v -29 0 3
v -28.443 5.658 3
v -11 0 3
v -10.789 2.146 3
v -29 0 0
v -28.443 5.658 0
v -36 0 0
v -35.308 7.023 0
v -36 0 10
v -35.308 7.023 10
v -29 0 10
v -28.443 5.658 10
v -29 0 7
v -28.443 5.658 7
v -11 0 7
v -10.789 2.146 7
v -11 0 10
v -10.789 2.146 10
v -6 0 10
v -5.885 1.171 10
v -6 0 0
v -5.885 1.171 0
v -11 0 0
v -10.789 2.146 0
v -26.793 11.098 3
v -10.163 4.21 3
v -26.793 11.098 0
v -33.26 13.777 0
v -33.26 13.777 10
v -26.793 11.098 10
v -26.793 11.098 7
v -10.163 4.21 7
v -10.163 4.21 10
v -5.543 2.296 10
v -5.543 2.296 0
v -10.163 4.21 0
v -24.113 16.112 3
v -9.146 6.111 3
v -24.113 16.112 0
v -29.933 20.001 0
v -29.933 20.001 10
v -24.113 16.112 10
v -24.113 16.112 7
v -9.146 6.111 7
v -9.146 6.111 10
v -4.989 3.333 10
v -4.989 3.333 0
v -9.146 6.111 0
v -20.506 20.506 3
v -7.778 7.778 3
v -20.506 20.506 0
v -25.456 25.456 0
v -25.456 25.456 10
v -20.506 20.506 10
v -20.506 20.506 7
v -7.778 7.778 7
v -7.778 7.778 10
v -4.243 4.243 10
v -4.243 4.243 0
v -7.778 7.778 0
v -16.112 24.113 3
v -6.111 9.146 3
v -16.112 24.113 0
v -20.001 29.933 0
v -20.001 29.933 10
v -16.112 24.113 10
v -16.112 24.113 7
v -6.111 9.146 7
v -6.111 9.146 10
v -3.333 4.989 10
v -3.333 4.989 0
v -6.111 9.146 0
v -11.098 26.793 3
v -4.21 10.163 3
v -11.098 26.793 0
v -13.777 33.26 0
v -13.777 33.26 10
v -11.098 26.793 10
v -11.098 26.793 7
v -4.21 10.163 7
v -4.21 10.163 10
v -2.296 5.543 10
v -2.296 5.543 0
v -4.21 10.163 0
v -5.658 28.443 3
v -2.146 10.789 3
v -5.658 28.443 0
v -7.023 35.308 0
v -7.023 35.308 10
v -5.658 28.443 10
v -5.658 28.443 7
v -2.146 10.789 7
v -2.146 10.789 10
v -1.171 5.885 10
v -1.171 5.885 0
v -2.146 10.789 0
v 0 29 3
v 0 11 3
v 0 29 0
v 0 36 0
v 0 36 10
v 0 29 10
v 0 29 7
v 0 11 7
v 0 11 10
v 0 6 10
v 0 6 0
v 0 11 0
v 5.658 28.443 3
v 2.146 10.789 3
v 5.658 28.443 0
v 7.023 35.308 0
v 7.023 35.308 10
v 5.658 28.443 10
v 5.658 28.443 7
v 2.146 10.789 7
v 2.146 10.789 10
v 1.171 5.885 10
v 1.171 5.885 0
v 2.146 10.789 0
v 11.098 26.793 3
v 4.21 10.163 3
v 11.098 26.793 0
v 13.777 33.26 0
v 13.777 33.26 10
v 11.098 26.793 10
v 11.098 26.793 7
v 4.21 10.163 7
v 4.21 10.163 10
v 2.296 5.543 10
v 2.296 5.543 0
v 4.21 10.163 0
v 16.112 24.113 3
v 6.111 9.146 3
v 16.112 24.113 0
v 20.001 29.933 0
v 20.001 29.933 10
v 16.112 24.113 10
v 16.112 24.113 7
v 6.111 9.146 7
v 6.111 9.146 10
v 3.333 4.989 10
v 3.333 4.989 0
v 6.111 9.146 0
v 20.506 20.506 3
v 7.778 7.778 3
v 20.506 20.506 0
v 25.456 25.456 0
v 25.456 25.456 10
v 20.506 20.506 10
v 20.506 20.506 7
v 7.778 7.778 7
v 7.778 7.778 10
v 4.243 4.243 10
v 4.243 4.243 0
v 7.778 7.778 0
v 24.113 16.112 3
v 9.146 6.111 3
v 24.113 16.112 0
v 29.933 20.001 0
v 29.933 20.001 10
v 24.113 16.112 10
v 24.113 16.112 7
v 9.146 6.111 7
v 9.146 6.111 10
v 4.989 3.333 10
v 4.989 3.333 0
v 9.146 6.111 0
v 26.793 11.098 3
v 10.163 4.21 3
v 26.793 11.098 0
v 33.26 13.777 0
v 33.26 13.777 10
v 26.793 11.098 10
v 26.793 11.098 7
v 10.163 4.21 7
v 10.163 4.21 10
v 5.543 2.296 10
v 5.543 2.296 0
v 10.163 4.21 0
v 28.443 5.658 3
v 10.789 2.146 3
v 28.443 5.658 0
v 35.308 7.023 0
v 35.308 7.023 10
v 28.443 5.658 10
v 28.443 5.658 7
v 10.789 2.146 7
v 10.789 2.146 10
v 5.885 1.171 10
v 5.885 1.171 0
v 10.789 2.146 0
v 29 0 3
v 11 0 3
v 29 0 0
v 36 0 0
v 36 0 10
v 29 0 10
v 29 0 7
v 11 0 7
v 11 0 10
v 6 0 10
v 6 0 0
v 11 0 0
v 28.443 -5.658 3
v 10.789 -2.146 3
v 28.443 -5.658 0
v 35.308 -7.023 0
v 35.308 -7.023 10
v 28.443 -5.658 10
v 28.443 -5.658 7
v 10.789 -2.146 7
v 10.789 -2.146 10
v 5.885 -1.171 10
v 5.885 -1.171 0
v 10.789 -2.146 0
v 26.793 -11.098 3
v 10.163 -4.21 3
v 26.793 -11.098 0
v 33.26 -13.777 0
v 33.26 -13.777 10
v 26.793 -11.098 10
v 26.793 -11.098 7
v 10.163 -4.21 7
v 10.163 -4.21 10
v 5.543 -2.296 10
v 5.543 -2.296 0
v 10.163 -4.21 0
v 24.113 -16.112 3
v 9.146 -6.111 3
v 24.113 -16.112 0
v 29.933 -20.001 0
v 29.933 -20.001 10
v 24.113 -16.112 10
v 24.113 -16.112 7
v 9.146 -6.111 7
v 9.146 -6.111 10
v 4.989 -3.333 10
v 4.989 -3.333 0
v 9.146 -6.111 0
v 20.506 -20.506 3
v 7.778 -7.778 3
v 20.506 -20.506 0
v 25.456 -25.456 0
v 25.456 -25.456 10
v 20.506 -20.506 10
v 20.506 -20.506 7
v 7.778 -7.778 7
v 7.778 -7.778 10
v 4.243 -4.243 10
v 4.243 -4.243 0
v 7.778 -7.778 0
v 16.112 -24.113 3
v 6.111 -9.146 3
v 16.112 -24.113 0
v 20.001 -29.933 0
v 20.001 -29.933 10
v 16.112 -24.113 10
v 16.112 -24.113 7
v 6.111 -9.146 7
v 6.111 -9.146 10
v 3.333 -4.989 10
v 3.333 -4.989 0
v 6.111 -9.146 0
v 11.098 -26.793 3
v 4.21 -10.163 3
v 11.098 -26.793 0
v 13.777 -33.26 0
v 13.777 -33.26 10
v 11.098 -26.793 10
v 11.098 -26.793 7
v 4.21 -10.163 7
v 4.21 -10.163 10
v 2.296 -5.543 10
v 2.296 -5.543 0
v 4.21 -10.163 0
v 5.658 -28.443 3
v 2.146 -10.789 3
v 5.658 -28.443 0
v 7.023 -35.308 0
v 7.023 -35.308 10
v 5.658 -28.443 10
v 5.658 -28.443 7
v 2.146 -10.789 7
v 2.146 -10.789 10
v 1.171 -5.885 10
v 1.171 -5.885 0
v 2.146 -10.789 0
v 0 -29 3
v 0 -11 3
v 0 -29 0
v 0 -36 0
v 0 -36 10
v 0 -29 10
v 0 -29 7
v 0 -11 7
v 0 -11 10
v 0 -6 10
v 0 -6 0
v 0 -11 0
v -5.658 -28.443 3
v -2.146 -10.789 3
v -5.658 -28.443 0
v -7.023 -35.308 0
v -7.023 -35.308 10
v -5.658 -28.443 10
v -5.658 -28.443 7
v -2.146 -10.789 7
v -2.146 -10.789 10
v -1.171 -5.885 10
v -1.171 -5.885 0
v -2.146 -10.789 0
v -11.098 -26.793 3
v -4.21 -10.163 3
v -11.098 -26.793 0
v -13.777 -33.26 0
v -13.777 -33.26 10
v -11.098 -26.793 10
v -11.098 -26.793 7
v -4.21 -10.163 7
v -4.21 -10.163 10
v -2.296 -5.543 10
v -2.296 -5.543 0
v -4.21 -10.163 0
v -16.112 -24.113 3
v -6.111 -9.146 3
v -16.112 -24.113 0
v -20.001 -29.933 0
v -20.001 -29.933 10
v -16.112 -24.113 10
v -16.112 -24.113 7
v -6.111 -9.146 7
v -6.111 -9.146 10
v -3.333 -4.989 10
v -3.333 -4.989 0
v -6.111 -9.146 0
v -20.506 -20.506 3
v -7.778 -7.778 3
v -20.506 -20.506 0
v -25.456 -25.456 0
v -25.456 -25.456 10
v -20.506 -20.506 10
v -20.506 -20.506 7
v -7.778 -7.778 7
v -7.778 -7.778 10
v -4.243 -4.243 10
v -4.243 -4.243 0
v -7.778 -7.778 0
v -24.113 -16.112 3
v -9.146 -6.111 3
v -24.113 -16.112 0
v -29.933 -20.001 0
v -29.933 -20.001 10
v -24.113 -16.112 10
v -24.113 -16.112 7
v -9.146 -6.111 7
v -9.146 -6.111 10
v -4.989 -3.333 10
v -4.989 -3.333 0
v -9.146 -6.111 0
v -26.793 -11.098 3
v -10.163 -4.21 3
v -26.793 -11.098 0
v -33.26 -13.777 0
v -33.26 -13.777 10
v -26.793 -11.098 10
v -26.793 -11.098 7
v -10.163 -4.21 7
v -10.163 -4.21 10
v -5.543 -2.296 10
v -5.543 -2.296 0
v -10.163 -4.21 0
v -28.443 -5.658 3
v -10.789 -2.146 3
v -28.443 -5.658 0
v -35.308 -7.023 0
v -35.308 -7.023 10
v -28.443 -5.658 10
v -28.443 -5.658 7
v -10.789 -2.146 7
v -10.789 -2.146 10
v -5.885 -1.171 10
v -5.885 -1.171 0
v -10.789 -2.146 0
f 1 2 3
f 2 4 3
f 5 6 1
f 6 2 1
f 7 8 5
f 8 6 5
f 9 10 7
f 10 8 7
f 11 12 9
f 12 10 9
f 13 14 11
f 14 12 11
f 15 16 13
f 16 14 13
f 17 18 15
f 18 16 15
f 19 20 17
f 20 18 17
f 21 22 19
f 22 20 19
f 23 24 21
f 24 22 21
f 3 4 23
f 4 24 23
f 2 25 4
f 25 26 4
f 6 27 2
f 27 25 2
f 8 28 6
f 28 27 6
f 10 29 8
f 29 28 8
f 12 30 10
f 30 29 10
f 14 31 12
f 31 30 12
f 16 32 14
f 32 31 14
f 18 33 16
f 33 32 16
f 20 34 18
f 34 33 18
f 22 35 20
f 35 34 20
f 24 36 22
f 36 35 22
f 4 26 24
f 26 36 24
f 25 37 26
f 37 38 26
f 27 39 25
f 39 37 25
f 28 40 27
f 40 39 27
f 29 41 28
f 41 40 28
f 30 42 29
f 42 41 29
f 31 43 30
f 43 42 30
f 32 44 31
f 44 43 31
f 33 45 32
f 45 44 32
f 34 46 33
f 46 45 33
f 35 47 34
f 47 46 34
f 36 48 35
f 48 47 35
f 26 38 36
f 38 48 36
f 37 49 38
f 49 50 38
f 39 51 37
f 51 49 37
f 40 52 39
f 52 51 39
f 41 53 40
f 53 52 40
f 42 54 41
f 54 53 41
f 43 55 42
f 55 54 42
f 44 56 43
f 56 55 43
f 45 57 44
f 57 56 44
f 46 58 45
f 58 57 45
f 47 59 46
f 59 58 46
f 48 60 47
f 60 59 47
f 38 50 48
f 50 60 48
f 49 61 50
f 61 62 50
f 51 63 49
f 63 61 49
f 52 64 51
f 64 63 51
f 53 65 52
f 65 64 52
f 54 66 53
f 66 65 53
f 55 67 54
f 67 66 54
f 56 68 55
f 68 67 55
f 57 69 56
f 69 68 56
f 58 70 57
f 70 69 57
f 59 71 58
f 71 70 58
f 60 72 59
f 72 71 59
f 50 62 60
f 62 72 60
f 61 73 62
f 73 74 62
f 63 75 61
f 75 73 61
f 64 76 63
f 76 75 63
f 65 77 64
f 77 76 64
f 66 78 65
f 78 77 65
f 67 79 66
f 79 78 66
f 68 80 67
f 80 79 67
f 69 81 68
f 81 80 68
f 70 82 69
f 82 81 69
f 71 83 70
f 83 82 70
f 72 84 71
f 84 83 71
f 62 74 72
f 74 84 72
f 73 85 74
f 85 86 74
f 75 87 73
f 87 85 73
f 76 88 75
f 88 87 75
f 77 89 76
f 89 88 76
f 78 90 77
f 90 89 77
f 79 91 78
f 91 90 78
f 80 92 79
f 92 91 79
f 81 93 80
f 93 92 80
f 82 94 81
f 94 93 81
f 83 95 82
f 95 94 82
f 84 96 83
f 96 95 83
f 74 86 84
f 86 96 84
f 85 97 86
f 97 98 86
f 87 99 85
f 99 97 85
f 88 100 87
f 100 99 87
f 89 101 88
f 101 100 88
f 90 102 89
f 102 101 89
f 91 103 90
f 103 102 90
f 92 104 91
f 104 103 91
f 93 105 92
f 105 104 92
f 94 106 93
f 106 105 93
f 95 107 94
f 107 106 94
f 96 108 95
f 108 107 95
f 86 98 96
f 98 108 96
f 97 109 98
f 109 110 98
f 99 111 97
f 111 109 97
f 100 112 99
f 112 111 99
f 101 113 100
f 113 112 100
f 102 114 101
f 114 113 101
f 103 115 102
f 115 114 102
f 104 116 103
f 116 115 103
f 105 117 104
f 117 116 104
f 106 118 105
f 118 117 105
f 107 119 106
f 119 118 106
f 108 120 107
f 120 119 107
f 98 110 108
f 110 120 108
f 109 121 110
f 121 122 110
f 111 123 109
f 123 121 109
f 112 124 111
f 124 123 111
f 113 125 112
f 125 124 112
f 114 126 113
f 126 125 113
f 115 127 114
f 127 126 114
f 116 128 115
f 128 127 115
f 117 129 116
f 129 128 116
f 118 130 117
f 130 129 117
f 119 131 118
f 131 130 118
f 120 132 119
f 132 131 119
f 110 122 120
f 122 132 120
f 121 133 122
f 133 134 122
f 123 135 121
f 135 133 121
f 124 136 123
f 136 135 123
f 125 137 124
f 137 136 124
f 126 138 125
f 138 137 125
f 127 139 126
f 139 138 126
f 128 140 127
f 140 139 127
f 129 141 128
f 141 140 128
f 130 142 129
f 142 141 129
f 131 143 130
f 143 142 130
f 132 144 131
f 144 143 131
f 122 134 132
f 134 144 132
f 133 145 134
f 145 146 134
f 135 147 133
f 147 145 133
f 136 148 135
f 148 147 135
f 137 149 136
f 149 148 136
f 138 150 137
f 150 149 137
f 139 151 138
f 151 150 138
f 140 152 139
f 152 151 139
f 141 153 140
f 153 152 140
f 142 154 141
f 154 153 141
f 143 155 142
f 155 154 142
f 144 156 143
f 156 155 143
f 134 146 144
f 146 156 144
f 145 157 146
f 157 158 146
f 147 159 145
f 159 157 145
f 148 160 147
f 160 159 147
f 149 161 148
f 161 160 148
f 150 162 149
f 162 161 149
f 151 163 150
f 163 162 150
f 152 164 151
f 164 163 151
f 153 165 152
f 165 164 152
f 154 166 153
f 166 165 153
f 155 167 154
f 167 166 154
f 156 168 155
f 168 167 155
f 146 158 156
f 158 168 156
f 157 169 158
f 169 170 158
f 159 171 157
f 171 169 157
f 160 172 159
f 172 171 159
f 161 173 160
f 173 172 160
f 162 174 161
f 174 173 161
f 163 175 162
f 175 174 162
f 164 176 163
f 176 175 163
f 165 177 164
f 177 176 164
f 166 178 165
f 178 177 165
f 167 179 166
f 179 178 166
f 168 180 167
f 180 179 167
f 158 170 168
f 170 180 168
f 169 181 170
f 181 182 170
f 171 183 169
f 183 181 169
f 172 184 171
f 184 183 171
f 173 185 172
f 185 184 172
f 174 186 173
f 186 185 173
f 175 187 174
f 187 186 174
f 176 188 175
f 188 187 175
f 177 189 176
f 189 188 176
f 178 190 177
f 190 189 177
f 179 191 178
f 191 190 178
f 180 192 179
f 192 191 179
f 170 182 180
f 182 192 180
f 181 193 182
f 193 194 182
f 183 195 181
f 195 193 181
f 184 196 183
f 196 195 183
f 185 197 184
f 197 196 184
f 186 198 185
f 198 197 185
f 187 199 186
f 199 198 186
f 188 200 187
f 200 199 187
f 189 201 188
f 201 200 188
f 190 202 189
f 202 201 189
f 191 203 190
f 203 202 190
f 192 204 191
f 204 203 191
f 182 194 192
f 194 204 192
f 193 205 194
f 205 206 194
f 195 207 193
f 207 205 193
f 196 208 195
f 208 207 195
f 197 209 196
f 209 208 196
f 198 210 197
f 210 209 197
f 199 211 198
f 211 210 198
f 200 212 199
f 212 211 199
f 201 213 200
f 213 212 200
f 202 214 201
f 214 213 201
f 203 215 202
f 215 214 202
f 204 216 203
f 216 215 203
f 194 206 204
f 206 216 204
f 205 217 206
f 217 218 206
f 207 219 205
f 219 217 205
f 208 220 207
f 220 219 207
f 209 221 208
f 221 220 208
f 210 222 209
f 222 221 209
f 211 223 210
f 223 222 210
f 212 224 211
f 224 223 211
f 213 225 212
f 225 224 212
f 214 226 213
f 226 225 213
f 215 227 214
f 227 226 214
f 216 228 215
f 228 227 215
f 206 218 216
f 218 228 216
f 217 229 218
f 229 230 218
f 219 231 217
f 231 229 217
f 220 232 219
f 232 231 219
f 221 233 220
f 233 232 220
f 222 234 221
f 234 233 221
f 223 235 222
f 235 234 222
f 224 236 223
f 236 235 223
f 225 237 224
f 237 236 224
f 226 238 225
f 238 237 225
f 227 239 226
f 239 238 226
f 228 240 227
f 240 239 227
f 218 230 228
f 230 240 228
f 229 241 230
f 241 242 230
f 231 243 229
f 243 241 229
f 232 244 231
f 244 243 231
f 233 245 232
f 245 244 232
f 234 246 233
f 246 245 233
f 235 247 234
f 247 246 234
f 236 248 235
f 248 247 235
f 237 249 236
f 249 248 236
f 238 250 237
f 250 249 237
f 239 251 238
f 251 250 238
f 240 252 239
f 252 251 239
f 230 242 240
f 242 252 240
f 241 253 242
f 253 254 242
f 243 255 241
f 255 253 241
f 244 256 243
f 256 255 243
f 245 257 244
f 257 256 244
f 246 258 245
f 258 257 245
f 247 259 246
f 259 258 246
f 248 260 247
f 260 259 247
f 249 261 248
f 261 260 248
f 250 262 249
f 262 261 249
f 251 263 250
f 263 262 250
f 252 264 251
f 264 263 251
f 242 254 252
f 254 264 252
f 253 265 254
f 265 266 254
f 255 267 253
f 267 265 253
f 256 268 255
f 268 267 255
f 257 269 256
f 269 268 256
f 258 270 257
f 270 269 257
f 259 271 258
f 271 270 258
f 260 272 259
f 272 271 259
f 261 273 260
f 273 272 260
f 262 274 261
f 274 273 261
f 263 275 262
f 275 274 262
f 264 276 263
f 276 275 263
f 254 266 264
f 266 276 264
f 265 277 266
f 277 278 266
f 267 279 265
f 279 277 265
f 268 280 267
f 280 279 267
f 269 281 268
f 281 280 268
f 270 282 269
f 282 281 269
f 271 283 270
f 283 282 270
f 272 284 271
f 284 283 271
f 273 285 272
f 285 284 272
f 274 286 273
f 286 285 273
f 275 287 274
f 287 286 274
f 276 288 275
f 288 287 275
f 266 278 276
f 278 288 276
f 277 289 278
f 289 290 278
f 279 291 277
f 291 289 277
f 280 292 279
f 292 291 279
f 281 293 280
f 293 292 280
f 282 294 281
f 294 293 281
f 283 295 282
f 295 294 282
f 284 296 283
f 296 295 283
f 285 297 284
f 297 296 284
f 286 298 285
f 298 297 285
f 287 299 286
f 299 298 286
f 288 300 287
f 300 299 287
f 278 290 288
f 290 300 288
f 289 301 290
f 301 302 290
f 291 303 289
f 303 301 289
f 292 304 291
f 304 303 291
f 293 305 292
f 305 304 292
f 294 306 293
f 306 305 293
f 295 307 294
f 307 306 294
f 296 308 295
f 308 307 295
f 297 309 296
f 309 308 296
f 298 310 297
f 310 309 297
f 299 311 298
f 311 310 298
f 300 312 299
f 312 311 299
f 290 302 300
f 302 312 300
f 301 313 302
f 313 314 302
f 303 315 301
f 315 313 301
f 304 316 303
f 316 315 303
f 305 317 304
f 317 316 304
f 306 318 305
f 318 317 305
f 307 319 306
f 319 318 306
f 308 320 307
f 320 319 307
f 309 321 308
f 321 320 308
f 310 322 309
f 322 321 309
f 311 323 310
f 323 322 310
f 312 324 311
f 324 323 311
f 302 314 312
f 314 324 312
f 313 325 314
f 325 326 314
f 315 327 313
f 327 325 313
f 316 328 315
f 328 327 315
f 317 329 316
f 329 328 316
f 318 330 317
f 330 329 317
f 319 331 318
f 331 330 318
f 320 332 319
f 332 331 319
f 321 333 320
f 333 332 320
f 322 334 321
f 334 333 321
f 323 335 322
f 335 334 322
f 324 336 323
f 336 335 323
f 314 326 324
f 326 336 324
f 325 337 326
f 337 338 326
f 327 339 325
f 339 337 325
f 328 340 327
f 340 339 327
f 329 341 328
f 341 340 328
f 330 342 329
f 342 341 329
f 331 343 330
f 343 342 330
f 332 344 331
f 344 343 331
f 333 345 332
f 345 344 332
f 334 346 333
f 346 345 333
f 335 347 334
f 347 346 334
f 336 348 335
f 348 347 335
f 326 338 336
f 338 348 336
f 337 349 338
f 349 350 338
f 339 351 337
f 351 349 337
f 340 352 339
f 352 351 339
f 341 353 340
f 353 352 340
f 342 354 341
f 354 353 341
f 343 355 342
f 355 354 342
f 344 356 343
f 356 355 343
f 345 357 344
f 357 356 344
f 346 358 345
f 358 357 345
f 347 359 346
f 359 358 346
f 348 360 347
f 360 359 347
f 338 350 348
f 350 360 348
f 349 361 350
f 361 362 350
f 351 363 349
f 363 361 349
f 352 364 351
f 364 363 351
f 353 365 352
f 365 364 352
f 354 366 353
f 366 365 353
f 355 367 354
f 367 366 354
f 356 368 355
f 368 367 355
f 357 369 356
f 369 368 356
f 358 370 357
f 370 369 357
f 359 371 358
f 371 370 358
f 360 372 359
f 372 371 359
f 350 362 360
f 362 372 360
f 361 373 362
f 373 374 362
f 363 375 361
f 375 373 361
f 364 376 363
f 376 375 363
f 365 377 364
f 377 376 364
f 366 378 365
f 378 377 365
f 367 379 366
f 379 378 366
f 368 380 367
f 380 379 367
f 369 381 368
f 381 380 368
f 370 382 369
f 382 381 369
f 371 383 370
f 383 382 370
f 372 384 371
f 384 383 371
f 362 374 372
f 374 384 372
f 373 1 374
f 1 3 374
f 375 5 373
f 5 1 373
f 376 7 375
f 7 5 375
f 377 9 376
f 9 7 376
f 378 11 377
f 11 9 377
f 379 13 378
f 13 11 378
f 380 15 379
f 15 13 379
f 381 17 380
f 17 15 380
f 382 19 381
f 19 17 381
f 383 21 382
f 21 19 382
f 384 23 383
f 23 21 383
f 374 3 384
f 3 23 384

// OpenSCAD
$fn = 32;

// ----------------------------------------------------------------------
// Revolved part: handwheel R36
// ----------------------------------------------------------------------

// --- parameters (mm) ---
bore_r = 6;               // bore radius
rim_r = 36;               // rim radius
rim_w = 7;                // rim axial width
rim_t = 10;               // rim diameter height
hub_r = 11;               // hub radius
web_t = 4;                // web thickness
revolve_angle = 360;      // revolve sweep, degrees

bore_d = 2 * bore_r;
rim_d = 2 * rim_r;
hub_d = 2 * hub_r;

profile = [[6, 0], [11, 0], [11, 3], [29, 3], [29, 0], [36, 0], [36, 10], [29, 10], [29, 7], [11, 7], [11, 10], [6, 10]];  // primary outline, 12 points, counter clockwise

// --- the one profile operation ---
rotate_extrude(angle = revolve_angle) polygon(points = profile);
